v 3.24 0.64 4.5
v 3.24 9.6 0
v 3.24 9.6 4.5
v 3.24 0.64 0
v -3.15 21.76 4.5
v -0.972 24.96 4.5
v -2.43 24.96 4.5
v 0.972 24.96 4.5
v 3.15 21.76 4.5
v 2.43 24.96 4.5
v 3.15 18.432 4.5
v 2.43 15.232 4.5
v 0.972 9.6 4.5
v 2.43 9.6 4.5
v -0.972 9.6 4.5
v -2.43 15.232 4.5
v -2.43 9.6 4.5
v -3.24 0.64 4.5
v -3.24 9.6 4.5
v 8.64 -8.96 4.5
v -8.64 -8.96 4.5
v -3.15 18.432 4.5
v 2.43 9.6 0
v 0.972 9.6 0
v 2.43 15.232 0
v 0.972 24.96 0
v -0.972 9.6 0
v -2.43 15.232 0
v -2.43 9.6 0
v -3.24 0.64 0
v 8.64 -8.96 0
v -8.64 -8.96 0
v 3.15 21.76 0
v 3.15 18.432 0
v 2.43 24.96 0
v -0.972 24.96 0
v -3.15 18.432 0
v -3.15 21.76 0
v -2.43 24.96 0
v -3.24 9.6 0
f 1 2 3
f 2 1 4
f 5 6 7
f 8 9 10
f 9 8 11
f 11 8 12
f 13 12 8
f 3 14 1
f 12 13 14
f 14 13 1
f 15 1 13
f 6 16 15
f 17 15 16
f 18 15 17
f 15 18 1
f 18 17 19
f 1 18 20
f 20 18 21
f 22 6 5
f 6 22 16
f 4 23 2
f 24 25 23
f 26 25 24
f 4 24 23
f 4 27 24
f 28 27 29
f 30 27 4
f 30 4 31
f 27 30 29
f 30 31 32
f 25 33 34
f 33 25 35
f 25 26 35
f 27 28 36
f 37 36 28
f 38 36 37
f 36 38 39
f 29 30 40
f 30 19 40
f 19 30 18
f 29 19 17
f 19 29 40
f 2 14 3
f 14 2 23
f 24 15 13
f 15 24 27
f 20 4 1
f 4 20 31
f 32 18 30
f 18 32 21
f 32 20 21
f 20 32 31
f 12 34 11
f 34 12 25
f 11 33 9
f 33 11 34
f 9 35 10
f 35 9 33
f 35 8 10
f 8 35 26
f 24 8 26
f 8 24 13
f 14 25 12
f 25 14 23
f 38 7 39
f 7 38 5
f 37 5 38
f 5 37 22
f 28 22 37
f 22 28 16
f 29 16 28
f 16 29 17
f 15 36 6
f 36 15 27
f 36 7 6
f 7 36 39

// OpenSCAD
$fn = 100;

// standard board thicknesses (mm)
PCB_THICK_06 = 0.6;
PCB_THICK_08 = 0.8;
PCB_THICK_10 = 1.0;
PCB_THICK_12 = 1.2;
PCB_THICK_16 = 1.6;

// standard board hole diameters
PCB_HOLE_30 = 3.0;

HEIGHT = 1.8;

// standard stand-off heights
STANDOFF_4 = 3.0;

// base dimensions
BASE_THICKNESS = 3.0;
BASE_DIAMETER = 12.0;
  
module pcb_support(coord,hole_dia,pcb_thick,standoff_height)
{
  translate(coord)
  {
    standoff(hole_dia,standoff_height);
    translate([standoff_height,0,0]) clip(hole_dia,pcb_thick,standoff_height);
  }
}

module baseWedge(hole_dia,base_thickness)
{
  standoff_side = hole_dia*1.2;              // width of standoff
  //standoff_thickness = hole_dia * .75;     // thickness of standoff bar
    standoff_thickness = HEIGHT;     // thickness of standoff bar
  
  translate([0,-base_thickness+0.2,0])
    linear_extrude(height=standoff_thickness)
    {
      polygon
      (
        points=
        [
          [-(standoff_side/2+base_thickness),0],
          [-standoff_side/2,base_thickness],
          [standoff_side/2,base_thickness],
          [standoff_side/2+base_thickness,0]
        ]
      );
    }
}

module standoff(hole_dia,height,base_thickness)
{
  standoff_side = hole_dia*1.2;             // width of standoff
  //standoff_thickness = hole_dia * .75;      // thickness of standoff bar
  standoff_thickness = HEIGHT;      // thickness of standoff bar
  shaft_width = hole_dia * 1.0;       // width of clip part that rests inside of the PCB hole
  slot_length = height/5-2;                   // length of cut slot
  slot_width = shaft_width * 0.4;           // amount of gap in the slot
  base_inset = 0.1;                         // inset of wedge into bottom of base
    
  // standoff
  translate([-standoff_side/2,0,0])
  {
    difference()
    {
      cube([standoff_side,height,standoff_thickness]);
      translate([standoff_side/2-slot_width/2,height-slot_length,0]) cube([slot_width,slot_length,standoff_thickness]);
    }
  }
  
  difference()
  {
    baseWedge(hole_dia,base_thickness);
    translate([-(standoff_side+base_thickness*2)/2,-base_thickness,0]) cube([standoff_side+base_thickness*2,base_inset,standoff_thickness]);
  }
}

//pcb_support([0,0,0],3,PCB_THICK_16,8);
module clip(hole_dia,pcb_thick)
{
clip_length = pcb_thick * 3;        // total length of clip
clip_width = hole_dia * 1.2;        // width of clip at its widest
//clip_thickness = hole_dia * .75;    // thickness of of the entire clip in the Z direction
clip_thickness = HEIGHT;    // thickness of of the entire clip in the Z direction
shaft_length = pcb_thick * 1.1;     // length of clip part that rests inside of the PCB hole
shaft_width = hole_dia * 0.9;       // width of clip part that rests inside of the PCB hole
slot_length = clip_length;      // length of cut slot
slot_width = shaft_width * 0.4;    // amount of gap in the slot
  
clip_lip = 0.4;                      // overhange on one side
clip_chamfer = hole_dia/3;           // side of triangle taken off of clip to produce a chamfer  
  
  translate([-shaft_width/2,0,0])
  linear_extrude(height=clip_thickness)
  {
    polygon 
    (
      points=
      [
        // left clip
        [0,0],
        [0,shaft_length],
        [-clip_lip,shaft_length+clip_chamfer],
        [-clip_lip,clip_length-clip_chamfer],
        [0,clip_length],
        [(shaft_width-slot_width)/2,clip_length],
        [(shaft_width-slot_width)/2,clip_length-slot_length],

        // right clip
        [(shaft_width-slot_width)/2+slot_width,clip_length-slot_length],
        [(shaft_width-slot_width)/2+slot_width,clip_length],
        [shaft_width,clip_length],
        [shaft_width+clip_lip,clip_length-clip_chamfer],
        [shaft_width+clip_lip,shaft_length+clip_chamfer],
        [shaft_width,shaft_length],
        [shaft_width,0]
      ]
    );
  }
}

scale([1.8,3.2,2.5])
{
translate([0,STANDOFF_4,0]) clip(PCB_HOLE_30,PCB_THICK_16);
standoff(PCB_HOLE_30,STANDOFF_4,BASE_THICKNESS);
}
